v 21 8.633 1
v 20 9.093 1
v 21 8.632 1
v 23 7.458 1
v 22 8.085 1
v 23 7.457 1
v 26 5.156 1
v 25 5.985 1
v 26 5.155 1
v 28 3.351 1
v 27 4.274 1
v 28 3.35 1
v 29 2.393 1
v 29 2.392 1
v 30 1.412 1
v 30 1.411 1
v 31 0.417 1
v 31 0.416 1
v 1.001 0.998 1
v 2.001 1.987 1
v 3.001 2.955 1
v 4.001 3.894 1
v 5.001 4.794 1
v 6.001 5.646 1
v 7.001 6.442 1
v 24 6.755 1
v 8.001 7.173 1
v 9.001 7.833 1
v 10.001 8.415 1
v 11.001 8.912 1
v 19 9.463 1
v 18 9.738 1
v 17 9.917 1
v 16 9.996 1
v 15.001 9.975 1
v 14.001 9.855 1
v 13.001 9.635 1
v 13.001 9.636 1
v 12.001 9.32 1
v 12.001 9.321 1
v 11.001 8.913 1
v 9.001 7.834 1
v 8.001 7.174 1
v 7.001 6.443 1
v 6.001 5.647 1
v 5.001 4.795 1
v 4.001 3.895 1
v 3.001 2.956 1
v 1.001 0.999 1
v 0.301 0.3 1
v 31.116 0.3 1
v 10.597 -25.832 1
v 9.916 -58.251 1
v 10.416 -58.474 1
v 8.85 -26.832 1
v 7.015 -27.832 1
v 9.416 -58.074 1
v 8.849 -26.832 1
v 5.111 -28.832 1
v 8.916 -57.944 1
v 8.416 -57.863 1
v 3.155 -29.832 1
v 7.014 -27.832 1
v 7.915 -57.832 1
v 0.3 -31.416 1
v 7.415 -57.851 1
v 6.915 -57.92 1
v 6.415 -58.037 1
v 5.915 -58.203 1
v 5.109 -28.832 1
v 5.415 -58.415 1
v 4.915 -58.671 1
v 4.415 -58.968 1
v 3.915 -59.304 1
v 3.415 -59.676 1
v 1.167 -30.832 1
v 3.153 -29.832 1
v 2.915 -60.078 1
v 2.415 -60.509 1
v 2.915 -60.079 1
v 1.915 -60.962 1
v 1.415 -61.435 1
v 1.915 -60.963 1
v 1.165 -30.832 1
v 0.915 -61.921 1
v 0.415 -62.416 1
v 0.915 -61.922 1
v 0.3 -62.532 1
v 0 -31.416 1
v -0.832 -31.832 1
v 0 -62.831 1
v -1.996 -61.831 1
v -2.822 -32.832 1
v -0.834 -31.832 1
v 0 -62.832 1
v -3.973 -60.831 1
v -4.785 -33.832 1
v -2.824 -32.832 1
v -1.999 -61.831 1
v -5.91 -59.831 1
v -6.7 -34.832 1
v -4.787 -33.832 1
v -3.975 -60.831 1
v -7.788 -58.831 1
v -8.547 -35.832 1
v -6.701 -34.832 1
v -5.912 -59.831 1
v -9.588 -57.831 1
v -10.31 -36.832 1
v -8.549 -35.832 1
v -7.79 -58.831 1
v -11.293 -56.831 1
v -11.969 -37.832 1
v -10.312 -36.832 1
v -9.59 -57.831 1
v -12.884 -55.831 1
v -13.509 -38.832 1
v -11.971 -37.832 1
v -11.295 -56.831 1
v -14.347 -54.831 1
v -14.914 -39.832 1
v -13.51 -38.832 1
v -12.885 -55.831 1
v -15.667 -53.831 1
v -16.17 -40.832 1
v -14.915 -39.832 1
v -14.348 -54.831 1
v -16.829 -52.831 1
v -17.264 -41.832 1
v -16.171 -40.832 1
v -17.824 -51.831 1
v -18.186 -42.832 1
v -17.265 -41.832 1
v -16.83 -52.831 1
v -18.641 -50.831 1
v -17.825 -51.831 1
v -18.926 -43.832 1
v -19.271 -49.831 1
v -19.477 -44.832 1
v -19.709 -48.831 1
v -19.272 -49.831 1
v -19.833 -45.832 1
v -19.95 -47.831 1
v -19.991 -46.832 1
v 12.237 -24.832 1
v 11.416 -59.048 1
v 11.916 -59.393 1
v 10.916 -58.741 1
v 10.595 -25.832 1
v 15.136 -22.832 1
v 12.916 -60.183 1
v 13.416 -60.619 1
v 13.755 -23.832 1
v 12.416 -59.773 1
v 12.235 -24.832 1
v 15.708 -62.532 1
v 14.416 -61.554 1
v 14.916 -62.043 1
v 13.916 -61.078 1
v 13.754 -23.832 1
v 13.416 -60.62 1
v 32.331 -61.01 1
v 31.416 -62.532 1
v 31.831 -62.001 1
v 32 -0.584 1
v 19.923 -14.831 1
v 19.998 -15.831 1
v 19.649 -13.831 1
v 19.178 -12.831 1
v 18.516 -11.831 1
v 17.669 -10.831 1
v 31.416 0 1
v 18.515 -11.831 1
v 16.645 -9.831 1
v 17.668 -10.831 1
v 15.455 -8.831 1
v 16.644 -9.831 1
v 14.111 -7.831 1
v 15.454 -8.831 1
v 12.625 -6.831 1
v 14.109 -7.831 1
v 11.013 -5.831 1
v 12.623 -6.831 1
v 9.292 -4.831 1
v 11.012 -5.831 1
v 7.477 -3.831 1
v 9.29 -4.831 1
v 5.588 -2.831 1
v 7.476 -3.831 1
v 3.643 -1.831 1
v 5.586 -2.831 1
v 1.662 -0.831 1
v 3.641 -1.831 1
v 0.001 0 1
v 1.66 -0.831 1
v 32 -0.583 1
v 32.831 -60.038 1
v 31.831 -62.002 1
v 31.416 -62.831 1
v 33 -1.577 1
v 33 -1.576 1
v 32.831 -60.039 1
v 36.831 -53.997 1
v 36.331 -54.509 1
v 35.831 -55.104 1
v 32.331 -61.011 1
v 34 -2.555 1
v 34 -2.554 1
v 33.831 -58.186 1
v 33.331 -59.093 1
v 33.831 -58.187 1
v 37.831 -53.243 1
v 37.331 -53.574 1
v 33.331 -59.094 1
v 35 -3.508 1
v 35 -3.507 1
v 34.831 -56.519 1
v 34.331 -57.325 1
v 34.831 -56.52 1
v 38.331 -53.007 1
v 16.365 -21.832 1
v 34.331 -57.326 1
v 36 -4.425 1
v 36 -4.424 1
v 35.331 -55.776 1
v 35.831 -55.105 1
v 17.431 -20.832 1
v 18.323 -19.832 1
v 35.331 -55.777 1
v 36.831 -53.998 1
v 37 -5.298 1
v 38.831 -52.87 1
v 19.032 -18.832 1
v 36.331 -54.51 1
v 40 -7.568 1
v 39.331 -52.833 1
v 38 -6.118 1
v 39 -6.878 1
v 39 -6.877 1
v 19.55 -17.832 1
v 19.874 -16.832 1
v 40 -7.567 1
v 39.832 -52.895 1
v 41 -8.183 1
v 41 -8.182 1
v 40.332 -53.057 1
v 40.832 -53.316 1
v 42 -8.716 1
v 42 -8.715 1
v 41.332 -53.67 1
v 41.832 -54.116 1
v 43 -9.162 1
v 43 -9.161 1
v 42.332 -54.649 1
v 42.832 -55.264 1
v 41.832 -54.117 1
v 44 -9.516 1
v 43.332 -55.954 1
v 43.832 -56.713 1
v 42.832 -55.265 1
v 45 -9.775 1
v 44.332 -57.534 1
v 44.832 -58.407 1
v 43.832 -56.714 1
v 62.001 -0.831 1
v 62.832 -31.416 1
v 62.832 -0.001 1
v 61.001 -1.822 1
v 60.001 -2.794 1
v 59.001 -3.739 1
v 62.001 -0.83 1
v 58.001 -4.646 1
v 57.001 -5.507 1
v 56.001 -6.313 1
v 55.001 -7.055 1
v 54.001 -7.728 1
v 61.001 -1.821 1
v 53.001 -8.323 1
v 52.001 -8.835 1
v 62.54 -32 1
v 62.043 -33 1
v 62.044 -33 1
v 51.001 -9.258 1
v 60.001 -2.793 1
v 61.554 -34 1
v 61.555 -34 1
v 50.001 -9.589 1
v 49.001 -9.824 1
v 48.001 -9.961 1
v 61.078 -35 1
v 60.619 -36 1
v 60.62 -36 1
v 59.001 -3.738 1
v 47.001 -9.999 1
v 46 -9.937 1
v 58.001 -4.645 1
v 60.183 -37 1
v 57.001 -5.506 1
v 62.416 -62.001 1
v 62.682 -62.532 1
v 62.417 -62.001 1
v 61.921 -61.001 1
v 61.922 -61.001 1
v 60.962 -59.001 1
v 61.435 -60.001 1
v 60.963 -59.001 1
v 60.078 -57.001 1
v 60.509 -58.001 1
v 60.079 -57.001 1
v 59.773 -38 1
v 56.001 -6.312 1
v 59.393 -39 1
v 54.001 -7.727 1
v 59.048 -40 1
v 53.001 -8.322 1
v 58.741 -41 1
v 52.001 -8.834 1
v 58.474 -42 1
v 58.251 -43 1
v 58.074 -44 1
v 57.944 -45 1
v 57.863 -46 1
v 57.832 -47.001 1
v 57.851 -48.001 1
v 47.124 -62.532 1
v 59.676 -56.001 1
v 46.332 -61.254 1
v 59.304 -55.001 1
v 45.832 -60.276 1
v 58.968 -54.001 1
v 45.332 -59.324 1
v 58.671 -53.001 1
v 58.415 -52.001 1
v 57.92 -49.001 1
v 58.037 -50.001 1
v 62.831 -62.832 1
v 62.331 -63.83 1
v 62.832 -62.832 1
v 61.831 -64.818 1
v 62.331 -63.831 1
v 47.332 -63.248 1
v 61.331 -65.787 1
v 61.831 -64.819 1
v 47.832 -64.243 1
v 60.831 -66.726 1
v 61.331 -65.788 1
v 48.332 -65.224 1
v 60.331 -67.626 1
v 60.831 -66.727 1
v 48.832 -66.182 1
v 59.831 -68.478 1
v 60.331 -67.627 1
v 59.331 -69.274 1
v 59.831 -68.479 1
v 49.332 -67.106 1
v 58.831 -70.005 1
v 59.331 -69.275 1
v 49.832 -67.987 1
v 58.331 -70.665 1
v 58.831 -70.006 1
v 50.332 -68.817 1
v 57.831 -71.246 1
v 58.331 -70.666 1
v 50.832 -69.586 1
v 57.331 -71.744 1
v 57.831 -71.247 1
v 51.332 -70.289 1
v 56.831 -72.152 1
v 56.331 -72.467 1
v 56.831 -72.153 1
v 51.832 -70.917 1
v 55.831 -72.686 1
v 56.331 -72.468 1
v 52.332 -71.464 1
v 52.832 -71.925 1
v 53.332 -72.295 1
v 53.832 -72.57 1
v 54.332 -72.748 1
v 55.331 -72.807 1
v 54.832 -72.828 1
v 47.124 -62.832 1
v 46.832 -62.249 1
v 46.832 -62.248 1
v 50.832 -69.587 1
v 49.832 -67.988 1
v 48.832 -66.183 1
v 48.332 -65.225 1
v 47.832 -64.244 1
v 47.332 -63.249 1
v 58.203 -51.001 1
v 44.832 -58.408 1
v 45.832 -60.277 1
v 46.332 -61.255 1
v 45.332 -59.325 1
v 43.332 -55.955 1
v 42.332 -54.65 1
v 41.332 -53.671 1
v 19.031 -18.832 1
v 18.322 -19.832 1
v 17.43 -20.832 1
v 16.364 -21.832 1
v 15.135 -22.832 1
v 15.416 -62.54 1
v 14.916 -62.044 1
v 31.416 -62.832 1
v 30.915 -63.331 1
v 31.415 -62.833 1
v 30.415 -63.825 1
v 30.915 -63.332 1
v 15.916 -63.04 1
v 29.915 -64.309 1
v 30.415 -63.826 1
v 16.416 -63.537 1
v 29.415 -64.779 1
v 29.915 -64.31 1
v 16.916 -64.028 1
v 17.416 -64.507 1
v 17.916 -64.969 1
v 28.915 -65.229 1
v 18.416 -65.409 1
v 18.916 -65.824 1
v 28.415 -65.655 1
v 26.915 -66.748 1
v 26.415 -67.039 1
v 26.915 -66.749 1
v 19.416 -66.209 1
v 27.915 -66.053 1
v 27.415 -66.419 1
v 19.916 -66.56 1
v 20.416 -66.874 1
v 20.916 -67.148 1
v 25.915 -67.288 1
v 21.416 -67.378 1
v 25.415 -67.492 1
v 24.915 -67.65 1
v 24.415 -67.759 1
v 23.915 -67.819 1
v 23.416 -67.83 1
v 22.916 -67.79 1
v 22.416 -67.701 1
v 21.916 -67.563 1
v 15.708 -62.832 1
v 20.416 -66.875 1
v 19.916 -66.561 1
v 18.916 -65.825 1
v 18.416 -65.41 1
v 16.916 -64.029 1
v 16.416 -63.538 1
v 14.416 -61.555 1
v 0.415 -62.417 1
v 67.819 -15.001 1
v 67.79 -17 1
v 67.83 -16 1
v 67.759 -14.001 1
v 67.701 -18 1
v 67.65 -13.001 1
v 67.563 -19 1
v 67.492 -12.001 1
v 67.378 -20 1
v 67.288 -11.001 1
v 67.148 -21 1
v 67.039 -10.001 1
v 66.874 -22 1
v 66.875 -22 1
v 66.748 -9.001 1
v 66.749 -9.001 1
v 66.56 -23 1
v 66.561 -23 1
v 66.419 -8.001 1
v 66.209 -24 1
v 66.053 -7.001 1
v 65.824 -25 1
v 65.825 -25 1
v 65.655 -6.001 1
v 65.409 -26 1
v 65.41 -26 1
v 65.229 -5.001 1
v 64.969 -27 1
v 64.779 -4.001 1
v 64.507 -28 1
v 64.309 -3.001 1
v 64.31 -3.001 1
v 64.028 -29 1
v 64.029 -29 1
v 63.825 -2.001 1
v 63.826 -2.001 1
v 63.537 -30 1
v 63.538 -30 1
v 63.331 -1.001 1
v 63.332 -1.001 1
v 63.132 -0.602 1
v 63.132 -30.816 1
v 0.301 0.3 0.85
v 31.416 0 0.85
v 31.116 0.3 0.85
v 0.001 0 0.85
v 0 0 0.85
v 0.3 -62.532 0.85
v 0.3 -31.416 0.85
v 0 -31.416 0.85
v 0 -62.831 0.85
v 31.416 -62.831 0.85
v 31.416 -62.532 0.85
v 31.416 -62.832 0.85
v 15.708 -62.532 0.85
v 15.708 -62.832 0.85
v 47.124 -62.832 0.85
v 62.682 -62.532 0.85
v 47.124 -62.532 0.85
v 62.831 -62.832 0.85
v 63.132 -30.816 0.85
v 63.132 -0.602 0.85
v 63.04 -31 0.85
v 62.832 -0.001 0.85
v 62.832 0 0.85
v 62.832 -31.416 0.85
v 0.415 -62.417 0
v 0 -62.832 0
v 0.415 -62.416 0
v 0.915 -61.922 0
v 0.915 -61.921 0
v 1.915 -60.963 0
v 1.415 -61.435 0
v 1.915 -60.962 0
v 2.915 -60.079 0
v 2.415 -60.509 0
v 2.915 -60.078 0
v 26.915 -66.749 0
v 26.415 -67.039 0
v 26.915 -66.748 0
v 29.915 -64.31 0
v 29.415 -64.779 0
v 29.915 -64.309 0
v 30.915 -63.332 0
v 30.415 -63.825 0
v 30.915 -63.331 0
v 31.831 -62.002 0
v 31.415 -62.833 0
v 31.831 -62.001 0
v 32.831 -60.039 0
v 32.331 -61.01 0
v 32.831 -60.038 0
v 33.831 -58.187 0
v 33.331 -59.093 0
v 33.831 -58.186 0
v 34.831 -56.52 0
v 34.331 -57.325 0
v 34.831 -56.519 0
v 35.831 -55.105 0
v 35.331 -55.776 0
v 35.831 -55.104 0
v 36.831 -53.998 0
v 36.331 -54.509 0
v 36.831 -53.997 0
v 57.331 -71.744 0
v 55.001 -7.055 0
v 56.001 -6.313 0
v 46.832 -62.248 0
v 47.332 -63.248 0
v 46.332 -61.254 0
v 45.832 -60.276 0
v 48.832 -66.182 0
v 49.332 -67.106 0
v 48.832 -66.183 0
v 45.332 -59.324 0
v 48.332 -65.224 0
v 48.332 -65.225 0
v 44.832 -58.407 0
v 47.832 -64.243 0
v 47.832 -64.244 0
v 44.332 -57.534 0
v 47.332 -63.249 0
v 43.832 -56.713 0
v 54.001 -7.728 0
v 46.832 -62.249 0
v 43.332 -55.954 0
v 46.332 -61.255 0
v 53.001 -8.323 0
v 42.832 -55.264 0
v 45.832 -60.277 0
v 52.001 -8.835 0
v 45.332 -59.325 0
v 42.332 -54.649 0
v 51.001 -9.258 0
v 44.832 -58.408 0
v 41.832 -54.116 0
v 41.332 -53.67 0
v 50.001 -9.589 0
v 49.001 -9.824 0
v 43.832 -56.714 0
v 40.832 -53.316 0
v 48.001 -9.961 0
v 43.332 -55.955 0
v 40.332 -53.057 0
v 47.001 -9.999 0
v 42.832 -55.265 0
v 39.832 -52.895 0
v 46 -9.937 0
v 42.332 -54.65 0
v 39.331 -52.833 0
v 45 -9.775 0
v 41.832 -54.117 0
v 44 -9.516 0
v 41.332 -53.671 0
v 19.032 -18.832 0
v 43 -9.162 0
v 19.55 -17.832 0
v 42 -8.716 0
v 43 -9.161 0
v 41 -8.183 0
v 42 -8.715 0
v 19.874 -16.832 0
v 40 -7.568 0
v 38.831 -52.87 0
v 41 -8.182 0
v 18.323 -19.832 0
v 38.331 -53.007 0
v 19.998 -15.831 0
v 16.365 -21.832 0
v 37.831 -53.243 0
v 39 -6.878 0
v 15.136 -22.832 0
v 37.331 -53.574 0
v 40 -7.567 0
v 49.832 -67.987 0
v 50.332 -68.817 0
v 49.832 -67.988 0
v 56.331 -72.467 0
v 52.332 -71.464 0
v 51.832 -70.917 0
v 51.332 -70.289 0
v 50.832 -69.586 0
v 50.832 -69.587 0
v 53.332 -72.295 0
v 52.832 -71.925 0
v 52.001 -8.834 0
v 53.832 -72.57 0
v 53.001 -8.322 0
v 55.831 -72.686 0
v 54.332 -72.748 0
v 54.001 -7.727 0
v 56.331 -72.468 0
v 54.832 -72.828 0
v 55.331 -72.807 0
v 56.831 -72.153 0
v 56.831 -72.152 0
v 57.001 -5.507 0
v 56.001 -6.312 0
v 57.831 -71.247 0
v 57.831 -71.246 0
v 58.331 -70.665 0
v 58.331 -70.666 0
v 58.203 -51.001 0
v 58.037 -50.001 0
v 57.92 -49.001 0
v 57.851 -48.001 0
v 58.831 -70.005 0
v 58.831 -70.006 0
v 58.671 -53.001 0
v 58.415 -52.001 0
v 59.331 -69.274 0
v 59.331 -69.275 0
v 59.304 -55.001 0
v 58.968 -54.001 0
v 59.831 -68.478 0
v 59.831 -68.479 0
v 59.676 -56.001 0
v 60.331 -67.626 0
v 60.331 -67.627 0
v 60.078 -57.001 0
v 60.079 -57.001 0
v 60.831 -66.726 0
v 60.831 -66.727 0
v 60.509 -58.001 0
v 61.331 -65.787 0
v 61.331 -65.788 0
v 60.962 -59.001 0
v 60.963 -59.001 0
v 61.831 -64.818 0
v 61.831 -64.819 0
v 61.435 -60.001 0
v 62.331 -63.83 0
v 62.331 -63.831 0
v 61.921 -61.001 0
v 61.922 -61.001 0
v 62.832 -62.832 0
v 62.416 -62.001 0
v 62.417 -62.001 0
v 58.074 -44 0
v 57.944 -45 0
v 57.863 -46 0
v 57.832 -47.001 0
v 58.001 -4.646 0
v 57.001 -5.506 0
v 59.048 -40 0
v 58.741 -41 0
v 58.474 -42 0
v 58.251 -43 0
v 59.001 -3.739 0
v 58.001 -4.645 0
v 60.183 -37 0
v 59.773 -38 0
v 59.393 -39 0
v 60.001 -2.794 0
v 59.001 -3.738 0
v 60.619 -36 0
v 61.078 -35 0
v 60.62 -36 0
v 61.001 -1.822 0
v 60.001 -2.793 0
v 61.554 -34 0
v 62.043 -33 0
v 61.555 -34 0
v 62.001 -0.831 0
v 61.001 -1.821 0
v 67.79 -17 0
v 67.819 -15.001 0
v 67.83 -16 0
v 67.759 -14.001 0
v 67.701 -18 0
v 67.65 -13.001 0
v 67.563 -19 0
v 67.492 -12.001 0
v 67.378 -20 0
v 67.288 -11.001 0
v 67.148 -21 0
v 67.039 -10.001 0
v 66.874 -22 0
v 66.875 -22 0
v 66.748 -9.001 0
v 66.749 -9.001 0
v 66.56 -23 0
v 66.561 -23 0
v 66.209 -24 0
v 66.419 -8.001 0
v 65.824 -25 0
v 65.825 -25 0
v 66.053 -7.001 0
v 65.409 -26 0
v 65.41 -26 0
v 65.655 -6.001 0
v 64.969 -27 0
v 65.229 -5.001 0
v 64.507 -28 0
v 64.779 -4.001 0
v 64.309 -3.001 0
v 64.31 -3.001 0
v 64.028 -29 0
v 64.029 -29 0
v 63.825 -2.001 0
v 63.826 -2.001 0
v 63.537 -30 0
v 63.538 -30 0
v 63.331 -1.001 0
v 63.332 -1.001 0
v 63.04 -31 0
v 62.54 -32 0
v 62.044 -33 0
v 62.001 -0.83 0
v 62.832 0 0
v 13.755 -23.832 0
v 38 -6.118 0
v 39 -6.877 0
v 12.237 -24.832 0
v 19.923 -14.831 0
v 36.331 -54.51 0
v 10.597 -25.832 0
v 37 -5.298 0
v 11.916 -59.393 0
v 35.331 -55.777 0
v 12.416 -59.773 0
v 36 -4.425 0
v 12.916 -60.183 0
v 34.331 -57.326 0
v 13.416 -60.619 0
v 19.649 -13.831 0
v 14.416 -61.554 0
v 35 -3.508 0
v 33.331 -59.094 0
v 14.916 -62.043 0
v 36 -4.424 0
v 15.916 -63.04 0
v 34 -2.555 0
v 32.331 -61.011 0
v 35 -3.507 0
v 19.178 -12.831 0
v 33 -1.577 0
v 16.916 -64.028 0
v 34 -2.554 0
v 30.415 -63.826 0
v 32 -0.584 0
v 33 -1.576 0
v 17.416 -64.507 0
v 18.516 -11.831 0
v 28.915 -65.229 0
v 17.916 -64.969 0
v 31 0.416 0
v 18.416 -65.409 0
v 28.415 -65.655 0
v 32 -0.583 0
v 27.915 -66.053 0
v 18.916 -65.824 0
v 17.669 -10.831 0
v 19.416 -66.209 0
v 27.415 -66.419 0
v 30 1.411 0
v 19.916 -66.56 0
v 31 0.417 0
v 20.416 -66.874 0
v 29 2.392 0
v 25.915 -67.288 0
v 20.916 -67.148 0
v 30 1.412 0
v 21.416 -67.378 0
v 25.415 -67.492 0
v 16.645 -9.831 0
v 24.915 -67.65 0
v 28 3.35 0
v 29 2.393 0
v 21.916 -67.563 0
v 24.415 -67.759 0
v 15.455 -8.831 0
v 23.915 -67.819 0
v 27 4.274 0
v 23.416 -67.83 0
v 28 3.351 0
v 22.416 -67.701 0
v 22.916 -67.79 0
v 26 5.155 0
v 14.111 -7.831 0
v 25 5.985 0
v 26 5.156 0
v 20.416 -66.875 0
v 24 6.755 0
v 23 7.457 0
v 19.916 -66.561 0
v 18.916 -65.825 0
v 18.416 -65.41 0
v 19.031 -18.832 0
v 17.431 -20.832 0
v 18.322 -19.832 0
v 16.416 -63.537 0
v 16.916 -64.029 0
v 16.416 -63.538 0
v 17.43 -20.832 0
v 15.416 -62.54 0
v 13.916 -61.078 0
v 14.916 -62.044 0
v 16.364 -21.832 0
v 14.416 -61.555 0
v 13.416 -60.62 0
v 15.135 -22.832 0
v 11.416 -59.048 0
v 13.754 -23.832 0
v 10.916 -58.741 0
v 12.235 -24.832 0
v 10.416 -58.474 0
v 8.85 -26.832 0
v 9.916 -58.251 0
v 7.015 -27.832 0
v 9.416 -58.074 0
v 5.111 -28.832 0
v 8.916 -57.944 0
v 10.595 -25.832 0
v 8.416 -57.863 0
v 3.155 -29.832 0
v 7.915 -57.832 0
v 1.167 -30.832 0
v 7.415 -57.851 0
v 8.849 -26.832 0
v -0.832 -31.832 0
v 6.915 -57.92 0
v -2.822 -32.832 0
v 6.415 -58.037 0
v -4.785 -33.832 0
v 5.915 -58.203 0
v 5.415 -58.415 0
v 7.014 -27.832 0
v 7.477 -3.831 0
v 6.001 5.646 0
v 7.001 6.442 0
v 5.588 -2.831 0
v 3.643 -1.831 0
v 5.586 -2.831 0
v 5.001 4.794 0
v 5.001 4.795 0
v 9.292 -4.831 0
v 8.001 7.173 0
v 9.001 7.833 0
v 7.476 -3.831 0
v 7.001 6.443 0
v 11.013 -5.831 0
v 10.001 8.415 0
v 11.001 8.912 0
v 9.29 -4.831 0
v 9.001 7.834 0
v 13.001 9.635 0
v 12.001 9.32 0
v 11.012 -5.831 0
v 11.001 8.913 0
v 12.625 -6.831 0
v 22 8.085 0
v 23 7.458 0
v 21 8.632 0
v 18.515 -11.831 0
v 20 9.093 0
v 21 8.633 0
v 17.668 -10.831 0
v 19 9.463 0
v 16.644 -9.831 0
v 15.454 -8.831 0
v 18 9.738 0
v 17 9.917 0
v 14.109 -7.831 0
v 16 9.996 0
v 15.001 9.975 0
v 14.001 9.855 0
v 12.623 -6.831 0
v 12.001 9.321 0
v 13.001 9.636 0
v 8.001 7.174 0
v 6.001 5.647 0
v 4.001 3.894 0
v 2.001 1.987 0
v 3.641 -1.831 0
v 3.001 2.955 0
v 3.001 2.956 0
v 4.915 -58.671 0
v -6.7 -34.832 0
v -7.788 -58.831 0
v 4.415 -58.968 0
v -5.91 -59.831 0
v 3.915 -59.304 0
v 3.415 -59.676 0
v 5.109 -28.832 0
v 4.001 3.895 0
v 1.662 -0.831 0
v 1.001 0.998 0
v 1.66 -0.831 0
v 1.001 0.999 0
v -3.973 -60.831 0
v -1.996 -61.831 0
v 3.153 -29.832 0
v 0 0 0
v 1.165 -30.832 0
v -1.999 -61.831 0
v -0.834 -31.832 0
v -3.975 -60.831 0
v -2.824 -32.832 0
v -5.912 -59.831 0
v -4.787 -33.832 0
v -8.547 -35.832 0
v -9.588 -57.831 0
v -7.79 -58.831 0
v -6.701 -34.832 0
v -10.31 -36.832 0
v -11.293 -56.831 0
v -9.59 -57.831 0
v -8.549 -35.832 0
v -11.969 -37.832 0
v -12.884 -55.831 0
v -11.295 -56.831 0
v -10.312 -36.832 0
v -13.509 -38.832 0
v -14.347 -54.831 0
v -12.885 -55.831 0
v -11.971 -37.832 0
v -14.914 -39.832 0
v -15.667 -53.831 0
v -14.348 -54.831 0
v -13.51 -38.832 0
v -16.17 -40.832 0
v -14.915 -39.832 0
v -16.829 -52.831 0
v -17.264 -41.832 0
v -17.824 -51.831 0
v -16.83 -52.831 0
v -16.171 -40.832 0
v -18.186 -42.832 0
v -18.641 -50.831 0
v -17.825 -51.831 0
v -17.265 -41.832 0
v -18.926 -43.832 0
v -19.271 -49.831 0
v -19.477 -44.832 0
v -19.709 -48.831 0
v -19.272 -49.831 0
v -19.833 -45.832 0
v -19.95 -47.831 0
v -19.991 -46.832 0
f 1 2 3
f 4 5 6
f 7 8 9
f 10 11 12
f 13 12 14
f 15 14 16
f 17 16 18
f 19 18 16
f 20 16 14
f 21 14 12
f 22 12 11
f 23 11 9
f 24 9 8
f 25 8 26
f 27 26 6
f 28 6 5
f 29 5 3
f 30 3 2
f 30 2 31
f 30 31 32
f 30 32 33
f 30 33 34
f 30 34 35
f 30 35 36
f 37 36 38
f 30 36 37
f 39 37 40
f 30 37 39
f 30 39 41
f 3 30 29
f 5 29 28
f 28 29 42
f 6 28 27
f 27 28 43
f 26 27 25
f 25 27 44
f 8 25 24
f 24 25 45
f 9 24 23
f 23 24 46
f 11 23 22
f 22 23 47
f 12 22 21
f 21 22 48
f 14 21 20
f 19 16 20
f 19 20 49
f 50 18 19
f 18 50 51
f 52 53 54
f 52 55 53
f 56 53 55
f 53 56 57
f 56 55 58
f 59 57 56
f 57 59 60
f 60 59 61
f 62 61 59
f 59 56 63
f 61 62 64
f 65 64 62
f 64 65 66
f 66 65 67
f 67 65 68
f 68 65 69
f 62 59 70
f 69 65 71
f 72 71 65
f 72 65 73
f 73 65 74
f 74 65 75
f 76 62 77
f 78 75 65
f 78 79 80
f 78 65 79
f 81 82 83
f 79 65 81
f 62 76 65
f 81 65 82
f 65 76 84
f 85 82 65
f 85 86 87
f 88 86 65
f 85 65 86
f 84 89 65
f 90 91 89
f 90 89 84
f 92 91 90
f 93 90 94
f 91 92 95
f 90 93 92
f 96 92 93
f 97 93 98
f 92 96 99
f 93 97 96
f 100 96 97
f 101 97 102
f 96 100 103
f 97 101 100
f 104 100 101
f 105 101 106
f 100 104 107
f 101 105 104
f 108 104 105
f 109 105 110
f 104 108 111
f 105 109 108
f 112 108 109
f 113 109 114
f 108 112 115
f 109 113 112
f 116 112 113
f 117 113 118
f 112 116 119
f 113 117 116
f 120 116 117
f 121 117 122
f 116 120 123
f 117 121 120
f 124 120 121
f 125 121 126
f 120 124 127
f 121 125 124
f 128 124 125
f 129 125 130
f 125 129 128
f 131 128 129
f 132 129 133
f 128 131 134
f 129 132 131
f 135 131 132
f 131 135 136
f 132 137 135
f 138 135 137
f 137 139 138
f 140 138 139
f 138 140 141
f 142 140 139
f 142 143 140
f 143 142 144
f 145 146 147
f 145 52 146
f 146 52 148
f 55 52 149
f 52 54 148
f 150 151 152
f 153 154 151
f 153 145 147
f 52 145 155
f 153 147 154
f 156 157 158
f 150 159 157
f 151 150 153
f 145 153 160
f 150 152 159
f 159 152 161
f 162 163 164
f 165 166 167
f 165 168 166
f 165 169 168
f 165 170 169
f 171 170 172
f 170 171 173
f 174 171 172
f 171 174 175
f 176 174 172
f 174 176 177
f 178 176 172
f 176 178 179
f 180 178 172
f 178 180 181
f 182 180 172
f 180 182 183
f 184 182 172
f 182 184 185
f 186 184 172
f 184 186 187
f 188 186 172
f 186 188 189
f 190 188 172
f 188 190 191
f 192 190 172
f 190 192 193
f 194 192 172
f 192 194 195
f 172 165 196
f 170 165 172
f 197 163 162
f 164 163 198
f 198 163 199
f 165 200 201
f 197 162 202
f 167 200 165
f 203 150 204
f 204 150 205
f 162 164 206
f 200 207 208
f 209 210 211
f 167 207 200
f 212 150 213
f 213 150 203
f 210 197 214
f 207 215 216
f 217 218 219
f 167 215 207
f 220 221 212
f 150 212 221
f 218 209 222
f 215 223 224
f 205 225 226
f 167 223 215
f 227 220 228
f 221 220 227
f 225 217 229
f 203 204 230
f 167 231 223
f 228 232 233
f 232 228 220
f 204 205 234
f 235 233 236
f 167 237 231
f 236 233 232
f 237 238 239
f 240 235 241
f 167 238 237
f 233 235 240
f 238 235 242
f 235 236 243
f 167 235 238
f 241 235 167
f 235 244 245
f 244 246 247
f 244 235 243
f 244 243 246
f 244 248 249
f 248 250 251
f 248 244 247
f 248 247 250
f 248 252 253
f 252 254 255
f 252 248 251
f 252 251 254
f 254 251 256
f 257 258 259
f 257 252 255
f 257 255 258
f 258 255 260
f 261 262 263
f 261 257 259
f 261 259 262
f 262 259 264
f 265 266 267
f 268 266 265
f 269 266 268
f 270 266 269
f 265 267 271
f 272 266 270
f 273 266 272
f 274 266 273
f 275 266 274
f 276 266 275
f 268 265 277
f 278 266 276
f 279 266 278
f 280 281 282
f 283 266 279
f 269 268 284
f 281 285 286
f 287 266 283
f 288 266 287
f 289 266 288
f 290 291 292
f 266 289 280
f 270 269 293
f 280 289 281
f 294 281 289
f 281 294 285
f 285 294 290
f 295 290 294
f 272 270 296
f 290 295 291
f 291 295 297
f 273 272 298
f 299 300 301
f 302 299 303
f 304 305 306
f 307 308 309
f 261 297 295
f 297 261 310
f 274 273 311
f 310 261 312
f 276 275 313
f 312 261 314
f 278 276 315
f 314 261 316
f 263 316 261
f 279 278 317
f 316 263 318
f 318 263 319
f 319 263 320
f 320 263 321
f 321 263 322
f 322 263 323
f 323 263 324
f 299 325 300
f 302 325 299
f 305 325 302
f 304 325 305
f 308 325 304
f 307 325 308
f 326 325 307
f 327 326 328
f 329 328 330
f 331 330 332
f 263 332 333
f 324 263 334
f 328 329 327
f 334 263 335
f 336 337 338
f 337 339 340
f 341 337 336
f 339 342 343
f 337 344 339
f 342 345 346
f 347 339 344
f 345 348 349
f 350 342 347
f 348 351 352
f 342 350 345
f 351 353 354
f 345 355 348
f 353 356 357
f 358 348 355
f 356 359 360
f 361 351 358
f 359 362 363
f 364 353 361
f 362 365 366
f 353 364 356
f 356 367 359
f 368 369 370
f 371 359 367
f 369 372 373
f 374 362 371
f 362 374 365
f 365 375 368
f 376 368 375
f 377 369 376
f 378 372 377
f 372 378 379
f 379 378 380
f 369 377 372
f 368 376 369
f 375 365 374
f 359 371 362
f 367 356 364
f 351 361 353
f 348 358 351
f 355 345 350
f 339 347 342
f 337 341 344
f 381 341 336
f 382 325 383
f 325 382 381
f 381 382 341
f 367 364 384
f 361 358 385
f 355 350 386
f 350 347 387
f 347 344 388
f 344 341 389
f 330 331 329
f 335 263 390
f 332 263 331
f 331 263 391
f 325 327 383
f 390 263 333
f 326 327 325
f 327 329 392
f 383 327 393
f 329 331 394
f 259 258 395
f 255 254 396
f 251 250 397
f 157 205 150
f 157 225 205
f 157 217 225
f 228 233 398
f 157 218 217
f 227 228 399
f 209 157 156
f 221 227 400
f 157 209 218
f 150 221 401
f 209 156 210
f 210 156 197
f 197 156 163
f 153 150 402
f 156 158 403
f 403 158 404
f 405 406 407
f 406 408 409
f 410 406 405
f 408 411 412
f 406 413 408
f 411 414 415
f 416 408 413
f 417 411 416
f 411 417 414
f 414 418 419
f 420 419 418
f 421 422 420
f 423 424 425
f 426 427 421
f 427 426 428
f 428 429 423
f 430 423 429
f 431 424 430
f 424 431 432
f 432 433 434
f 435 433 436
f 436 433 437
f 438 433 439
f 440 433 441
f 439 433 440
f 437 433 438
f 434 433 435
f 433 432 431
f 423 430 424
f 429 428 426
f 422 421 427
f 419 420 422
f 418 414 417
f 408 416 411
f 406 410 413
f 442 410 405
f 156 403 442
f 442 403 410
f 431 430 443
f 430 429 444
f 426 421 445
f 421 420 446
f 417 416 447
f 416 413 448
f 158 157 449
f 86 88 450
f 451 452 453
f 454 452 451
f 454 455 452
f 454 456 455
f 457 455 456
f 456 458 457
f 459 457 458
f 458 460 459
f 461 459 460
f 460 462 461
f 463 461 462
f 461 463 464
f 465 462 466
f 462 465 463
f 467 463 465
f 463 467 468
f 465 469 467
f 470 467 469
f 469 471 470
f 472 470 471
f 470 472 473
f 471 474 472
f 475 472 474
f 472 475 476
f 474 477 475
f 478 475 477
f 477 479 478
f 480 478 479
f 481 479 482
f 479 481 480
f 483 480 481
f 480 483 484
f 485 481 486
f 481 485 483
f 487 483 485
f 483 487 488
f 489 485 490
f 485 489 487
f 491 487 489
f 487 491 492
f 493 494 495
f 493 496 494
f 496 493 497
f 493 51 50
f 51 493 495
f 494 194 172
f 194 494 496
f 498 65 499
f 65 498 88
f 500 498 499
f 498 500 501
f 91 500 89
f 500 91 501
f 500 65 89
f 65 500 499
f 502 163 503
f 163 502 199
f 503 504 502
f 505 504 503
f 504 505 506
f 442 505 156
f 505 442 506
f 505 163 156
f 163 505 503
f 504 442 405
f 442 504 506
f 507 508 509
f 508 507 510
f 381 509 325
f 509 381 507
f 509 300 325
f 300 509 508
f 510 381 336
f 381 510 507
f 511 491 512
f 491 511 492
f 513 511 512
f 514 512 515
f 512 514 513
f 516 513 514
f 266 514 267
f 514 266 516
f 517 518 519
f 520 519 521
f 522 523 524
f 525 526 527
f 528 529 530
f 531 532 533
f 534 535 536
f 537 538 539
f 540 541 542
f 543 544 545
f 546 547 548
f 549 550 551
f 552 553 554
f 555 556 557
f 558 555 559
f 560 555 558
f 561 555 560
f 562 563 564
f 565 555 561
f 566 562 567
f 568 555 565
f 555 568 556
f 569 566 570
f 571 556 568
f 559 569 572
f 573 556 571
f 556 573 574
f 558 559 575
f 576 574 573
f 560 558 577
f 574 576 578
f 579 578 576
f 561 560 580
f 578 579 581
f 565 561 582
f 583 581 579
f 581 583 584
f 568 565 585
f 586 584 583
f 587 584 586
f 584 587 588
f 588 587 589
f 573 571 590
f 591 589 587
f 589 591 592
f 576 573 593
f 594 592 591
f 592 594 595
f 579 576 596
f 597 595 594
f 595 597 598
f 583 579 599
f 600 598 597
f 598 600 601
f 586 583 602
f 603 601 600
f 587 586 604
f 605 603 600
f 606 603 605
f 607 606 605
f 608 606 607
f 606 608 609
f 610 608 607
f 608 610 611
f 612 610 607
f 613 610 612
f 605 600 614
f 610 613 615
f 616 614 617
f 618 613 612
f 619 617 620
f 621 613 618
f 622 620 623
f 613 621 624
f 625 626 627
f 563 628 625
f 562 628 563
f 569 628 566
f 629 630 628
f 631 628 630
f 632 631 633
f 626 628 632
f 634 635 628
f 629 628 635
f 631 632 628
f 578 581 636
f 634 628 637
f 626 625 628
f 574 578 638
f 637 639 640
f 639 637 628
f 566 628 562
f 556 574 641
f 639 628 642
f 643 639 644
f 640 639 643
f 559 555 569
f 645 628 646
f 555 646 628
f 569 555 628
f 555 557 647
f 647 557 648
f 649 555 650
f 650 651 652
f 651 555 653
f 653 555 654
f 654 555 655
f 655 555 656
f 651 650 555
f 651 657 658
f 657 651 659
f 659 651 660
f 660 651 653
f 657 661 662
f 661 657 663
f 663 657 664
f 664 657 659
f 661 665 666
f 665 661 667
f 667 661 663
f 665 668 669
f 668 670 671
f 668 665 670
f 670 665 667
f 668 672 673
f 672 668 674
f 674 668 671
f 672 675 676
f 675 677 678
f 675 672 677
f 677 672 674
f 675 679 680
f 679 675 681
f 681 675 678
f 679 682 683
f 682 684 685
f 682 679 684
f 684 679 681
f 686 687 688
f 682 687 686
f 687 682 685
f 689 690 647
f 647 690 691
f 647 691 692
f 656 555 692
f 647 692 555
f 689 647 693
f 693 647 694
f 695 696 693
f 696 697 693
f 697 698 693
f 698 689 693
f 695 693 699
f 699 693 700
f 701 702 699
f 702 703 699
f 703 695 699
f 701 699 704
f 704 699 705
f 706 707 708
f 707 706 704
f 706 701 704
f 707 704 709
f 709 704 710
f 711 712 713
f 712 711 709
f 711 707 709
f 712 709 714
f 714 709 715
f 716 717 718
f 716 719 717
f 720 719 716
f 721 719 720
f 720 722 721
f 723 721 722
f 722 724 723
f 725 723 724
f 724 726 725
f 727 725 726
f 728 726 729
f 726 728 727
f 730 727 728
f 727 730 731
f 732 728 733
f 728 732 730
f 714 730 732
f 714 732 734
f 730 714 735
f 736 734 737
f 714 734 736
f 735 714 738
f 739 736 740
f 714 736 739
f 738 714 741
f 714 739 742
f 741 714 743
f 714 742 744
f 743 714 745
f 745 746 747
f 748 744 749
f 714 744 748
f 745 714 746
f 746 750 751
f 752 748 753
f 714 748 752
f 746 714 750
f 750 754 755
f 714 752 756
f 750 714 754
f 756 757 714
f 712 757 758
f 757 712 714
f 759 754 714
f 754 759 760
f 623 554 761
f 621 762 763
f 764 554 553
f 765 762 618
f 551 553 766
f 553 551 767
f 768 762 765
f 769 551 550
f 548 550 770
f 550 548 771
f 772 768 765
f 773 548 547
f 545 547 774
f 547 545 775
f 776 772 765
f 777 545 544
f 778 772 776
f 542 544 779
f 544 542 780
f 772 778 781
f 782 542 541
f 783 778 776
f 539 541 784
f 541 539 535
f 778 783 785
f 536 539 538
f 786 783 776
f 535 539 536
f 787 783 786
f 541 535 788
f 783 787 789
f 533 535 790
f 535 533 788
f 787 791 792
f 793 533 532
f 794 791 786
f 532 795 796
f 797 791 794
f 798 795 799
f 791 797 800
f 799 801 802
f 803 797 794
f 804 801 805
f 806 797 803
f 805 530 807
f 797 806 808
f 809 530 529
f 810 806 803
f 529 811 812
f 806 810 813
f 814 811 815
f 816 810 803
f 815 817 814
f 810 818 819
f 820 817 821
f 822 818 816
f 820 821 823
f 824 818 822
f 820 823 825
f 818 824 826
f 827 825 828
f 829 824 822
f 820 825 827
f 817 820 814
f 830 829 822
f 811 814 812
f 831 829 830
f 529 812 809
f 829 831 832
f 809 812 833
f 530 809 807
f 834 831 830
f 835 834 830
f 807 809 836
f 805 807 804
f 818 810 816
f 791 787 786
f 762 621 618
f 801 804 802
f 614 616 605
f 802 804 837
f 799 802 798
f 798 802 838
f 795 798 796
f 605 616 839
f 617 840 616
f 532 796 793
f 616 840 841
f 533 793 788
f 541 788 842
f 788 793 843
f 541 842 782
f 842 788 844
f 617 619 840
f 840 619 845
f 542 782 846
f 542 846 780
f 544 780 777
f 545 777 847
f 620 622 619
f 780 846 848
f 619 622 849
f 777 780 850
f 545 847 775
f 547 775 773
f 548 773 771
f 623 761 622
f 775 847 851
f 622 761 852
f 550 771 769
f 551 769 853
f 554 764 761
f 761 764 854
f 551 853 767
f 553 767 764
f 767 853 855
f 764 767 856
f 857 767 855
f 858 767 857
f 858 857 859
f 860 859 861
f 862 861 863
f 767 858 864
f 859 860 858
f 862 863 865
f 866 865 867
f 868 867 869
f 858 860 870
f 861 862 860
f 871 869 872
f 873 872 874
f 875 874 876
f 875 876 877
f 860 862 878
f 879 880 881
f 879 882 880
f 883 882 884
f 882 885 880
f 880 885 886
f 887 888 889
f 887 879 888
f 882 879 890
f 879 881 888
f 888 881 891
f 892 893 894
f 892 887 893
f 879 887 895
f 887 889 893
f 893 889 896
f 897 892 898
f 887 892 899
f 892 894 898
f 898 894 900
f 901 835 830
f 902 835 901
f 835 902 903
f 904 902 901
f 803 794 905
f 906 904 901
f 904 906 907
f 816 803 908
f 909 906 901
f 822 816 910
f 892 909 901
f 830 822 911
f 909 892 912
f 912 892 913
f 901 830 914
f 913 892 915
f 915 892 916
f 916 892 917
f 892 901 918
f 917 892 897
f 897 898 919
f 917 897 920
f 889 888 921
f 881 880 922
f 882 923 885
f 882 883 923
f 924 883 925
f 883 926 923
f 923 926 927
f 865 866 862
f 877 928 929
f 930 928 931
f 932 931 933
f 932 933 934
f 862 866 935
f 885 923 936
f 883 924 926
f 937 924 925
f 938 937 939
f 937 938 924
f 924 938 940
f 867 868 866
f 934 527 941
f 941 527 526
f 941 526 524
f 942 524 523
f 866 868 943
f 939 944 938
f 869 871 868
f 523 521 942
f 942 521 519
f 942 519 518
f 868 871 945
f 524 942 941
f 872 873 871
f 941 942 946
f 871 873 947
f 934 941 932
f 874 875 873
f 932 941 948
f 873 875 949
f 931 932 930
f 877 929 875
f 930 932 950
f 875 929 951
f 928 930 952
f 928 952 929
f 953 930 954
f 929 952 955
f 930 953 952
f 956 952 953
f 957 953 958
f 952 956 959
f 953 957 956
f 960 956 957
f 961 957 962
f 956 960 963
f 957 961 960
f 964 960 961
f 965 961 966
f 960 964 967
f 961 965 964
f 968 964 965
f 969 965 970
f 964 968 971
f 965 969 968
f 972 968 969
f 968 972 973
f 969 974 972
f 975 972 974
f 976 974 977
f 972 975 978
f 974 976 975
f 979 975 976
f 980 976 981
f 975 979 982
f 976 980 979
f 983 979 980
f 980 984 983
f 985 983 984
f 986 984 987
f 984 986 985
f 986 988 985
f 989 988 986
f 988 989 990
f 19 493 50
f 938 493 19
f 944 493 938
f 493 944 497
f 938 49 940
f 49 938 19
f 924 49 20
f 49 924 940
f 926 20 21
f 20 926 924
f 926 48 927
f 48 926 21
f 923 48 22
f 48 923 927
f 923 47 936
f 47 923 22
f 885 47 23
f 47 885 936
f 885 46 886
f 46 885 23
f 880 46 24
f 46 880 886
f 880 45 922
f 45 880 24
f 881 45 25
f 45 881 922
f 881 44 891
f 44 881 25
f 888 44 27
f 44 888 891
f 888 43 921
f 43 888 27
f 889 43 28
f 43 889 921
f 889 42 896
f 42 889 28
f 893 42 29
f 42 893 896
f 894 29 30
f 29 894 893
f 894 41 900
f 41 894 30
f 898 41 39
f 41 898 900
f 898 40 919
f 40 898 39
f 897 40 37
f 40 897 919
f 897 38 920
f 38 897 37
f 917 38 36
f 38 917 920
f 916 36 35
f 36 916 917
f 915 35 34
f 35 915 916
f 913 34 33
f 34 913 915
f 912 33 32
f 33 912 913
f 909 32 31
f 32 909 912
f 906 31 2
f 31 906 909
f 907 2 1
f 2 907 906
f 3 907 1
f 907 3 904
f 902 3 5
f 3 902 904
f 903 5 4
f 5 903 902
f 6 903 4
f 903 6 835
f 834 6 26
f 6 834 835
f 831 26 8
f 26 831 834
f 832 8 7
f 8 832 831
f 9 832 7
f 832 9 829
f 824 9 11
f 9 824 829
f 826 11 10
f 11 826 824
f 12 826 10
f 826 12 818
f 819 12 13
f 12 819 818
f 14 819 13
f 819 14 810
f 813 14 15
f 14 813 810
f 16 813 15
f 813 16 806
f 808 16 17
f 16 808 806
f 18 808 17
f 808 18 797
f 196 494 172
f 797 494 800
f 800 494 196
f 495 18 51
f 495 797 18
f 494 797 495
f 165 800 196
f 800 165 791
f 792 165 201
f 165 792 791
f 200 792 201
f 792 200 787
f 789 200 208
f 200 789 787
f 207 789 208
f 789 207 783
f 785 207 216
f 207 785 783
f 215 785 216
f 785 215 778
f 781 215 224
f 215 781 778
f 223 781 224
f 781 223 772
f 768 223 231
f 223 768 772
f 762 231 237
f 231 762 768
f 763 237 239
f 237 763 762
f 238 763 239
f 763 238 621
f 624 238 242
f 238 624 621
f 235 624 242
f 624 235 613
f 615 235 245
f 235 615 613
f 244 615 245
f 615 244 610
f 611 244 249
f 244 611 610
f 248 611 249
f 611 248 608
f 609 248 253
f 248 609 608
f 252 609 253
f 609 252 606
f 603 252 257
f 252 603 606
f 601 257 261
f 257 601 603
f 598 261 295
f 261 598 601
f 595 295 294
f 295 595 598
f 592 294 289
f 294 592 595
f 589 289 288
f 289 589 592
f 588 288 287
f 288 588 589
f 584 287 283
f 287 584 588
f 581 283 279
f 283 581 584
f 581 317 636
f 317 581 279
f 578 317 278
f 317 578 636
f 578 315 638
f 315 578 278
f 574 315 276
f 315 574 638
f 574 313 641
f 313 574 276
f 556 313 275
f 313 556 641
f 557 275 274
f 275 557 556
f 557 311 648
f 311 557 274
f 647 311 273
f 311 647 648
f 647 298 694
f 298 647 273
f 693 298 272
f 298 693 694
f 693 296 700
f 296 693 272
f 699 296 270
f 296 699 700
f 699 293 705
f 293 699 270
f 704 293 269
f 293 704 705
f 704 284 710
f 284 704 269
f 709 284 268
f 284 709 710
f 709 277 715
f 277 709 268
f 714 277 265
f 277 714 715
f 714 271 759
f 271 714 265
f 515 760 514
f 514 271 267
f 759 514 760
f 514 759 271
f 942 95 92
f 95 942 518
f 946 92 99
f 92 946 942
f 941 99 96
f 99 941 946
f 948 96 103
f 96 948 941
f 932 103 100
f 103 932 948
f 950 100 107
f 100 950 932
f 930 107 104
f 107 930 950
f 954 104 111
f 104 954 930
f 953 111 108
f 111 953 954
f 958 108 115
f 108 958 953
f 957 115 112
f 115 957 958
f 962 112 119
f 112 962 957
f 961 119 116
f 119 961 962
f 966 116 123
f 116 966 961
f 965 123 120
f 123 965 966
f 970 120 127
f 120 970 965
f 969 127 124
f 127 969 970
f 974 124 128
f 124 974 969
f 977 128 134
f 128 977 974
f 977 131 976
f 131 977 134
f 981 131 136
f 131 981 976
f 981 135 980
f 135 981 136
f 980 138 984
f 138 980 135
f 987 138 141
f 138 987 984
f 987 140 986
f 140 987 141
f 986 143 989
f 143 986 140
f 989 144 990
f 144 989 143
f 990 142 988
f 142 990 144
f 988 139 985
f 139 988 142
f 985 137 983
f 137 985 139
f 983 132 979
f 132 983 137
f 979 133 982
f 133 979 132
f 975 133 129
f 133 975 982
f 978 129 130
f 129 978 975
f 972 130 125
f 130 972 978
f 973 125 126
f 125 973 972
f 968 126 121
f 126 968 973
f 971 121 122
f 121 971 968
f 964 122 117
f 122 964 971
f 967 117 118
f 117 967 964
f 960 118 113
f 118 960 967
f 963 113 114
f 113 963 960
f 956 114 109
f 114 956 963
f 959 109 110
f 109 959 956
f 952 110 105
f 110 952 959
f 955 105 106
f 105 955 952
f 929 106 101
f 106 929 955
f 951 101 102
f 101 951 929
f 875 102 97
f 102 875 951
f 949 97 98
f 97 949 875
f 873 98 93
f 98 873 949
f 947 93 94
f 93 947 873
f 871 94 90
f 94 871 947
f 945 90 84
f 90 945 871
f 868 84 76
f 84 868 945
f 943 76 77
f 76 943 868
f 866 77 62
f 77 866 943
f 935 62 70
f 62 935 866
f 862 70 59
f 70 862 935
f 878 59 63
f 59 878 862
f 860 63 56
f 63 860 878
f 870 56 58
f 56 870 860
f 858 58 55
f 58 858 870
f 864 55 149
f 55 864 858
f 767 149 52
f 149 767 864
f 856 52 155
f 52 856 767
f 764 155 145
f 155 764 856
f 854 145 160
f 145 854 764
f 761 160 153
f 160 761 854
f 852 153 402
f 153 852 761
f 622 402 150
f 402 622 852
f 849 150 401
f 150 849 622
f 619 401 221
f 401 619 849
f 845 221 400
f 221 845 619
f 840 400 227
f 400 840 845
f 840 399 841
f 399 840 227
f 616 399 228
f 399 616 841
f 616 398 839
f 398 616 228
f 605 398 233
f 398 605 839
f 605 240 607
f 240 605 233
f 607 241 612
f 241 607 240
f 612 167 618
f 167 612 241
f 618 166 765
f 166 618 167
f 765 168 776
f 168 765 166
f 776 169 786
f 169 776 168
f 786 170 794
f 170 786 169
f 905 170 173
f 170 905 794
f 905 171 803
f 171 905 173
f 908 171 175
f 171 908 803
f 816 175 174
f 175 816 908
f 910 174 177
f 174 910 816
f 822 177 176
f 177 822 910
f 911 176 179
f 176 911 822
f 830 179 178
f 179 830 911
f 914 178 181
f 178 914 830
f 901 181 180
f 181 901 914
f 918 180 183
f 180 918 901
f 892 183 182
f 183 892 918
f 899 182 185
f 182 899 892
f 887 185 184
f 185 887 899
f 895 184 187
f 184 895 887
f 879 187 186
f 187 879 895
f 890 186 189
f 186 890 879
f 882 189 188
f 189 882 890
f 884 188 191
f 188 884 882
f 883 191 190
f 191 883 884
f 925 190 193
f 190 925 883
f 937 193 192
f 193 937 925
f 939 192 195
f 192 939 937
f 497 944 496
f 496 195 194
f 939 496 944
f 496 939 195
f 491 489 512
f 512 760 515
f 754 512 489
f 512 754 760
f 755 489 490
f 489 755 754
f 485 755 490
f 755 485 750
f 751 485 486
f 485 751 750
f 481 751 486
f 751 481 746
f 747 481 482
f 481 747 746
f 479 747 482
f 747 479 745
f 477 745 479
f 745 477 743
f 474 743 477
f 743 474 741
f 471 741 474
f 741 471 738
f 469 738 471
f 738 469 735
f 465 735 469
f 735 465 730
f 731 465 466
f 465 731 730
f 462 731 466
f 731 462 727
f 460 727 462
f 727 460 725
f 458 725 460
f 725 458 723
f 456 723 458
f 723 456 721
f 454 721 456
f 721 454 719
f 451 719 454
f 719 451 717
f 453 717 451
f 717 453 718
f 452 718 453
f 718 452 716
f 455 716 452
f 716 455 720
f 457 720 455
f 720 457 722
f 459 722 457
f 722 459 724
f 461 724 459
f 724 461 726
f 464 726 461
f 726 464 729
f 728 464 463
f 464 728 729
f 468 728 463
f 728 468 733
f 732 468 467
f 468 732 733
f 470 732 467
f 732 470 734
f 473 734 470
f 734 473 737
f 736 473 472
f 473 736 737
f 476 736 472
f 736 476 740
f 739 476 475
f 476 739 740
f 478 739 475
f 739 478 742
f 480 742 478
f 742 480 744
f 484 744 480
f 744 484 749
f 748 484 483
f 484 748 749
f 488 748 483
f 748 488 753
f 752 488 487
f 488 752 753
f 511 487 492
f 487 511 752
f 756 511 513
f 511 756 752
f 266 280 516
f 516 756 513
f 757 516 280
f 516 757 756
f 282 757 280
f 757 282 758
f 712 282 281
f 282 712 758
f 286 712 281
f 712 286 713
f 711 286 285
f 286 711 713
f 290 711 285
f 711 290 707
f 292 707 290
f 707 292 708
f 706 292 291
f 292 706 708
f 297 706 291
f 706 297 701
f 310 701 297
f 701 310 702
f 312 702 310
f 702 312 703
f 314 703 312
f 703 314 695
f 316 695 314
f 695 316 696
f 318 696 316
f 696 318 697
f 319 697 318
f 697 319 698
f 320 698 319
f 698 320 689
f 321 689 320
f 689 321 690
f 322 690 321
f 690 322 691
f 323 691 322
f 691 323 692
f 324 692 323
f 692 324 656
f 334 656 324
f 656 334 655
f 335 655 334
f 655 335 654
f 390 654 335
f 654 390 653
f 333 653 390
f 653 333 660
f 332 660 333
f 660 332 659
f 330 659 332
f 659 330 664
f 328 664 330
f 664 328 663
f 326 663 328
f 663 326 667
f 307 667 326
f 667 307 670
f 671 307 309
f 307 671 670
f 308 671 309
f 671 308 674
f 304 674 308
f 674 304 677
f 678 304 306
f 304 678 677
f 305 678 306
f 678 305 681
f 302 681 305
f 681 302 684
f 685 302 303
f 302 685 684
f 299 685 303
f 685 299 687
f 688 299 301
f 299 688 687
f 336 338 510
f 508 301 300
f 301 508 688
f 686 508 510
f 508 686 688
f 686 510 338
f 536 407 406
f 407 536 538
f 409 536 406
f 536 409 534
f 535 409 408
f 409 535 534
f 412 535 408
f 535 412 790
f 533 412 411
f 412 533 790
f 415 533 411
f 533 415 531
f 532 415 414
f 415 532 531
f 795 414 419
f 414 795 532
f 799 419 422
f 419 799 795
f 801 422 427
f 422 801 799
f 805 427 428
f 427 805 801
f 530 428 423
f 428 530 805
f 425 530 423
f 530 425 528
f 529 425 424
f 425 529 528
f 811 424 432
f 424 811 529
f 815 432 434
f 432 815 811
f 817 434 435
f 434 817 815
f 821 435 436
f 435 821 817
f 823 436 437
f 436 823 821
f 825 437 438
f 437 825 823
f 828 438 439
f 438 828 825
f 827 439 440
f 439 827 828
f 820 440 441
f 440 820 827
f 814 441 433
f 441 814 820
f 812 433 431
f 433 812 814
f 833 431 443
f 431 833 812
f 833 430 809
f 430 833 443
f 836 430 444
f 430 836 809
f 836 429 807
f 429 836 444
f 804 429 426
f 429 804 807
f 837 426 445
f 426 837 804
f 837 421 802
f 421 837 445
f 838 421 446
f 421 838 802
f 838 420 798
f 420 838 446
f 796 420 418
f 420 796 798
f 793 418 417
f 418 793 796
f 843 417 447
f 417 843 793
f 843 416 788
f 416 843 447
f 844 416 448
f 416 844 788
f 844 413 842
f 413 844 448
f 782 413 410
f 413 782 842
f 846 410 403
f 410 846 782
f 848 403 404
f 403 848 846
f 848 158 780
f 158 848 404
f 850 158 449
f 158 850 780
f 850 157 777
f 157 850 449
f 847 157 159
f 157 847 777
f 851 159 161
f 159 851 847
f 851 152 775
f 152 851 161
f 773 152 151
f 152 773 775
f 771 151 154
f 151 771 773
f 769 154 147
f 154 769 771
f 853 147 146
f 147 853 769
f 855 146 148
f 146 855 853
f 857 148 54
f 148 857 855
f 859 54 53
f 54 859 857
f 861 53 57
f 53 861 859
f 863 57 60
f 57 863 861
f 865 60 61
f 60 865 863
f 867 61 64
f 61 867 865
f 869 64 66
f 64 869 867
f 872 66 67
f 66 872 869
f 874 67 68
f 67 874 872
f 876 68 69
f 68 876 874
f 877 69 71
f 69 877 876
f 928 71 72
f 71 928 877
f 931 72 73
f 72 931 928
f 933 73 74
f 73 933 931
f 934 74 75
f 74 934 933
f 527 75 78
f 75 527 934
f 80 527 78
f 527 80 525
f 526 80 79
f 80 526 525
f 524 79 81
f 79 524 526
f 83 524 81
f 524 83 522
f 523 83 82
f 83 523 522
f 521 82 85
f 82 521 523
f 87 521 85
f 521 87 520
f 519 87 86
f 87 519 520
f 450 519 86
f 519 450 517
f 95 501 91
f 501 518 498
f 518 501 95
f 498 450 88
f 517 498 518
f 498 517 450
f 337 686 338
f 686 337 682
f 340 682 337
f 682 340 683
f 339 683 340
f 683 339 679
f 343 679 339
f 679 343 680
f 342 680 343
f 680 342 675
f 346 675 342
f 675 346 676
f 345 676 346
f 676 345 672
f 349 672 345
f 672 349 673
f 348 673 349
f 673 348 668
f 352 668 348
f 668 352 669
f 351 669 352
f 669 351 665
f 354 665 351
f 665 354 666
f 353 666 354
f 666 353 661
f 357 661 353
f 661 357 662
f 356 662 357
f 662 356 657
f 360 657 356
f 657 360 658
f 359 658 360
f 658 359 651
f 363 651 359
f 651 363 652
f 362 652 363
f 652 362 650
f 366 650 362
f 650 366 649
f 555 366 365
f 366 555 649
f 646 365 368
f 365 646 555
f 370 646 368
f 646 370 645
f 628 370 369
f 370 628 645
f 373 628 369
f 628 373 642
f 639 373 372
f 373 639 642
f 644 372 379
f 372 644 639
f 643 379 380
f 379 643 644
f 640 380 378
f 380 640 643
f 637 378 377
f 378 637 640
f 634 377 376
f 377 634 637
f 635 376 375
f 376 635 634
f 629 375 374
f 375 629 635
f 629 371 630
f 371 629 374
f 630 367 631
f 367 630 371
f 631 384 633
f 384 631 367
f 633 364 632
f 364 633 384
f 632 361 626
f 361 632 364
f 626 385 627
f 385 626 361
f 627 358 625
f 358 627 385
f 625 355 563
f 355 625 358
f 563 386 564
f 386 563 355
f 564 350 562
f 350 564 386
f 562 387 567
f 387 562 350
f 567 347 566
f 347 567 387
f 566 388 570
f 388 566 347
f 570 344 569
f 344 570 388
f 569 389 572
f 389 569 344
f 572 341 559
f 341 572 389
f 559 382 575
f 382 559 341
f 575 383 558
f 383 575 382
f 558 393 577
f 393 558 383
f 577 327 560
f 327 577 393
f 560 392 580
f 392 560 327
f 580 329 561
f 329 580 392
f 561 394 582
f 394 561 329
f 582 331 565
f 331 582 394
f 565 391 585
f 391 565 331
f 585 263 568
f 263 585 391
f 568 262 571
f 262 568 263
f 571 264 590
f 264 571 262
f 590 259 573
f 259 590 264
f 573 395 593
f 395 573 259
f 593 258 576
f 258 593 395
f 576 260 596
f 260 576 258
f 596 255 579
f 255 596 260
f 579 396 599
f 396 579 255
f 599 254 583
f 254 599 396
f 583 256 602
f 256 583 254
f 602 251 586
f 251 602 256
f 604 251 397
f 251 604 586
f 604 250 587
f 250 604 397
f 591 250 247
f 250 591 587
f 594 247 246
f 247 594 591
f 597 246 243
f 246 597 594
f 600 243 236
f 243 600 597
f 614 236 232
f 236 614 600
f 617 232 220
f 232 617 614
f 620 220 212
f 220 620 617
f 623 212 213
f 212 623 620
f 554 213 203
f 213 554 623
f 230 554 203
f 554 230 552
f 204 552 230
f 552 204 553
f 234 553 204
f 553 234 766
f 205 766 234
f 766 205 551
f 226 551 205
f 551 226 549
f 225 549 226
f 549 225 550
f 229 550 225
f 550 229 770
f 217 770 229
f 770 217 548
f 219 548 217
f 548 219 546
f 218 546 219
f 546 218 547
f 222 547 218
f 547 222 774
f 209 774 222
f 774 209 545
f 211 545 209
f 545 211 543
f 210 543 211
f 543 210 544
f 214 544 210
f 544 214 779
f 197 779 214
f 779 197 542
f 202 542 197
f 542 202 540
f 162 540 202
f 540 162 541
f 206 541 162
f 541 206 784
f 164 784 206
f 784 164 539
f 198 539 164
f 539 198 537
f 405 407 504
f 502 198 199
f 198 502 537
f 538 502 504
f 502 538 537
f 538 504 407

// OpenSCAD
$fn = 25;

dx = 0.1;
pi = 3.14159265;
h = 5;

module sinusoid() {
	translate([0, 0, -0.1]) linear_extrude(height=1.2) scale([10, 10])	
	for (i = [0 : dx : 2*pi]) {
		translate([i, 0]) polygon([[0, sin(i*180/pi)], [1.001*dx, sin((i+dx) * 180 / pi)], [1.001*dx, h], [0, h]]);
	}
}

module lines() {
	translate([0, 0, 0.85]) cube([10*pi, 0.3, 0.15]);
	translate([0, -20*pi, 0.85]) cube([0.3, 10*pi, 0.15]);
	translate([5*pi, -20*pi, 0.85]) cube([5*pi, 0.3, 0.15]);
	translate([15*pi, -20*pi, 0.85]) cube([5*pi, 0.3, 0.15]);
	translate([20*pi, -10*pi, 0.85]) cube([0.3, 10*pi, 0.15]);
}

difference() {
	translate([-30, -80, 0]) cube([100, 100, 1]);
	sinusoid();
	translate([0, -20*pi, 0]) rotate([0, 0, 90]) scale([1, 2, 1]) sinusoid();
	translate([20*pi, , 0]) rotate([0, 0, -90]) scale([1, 1/2, 1]) sinusoid();
	translate([10*pi, -20*pi, 0]) rotate([0, 0, 180]) scale([1/2, 1/2, 1]) sinusoid();
	translate([20*pi, -20*pi, 0]) rotate([0, 0, 180]) scale([1/2, 1, 1]) sinusoid();
	translate([-30, 0, -0.1]) cube([30, 20, 1.2]);
	translate([-30, -20*pi-20, -0.1]) cube([30, 20, 1.2]);
	translate([20*pi, 0, -0.1]) cube([30, 20, 1.2]);
	translate([20*pi, -20*pi-20, -0.1]) cube([30, 20, 1.2]);
	lines();
}
//color("red") lines();
